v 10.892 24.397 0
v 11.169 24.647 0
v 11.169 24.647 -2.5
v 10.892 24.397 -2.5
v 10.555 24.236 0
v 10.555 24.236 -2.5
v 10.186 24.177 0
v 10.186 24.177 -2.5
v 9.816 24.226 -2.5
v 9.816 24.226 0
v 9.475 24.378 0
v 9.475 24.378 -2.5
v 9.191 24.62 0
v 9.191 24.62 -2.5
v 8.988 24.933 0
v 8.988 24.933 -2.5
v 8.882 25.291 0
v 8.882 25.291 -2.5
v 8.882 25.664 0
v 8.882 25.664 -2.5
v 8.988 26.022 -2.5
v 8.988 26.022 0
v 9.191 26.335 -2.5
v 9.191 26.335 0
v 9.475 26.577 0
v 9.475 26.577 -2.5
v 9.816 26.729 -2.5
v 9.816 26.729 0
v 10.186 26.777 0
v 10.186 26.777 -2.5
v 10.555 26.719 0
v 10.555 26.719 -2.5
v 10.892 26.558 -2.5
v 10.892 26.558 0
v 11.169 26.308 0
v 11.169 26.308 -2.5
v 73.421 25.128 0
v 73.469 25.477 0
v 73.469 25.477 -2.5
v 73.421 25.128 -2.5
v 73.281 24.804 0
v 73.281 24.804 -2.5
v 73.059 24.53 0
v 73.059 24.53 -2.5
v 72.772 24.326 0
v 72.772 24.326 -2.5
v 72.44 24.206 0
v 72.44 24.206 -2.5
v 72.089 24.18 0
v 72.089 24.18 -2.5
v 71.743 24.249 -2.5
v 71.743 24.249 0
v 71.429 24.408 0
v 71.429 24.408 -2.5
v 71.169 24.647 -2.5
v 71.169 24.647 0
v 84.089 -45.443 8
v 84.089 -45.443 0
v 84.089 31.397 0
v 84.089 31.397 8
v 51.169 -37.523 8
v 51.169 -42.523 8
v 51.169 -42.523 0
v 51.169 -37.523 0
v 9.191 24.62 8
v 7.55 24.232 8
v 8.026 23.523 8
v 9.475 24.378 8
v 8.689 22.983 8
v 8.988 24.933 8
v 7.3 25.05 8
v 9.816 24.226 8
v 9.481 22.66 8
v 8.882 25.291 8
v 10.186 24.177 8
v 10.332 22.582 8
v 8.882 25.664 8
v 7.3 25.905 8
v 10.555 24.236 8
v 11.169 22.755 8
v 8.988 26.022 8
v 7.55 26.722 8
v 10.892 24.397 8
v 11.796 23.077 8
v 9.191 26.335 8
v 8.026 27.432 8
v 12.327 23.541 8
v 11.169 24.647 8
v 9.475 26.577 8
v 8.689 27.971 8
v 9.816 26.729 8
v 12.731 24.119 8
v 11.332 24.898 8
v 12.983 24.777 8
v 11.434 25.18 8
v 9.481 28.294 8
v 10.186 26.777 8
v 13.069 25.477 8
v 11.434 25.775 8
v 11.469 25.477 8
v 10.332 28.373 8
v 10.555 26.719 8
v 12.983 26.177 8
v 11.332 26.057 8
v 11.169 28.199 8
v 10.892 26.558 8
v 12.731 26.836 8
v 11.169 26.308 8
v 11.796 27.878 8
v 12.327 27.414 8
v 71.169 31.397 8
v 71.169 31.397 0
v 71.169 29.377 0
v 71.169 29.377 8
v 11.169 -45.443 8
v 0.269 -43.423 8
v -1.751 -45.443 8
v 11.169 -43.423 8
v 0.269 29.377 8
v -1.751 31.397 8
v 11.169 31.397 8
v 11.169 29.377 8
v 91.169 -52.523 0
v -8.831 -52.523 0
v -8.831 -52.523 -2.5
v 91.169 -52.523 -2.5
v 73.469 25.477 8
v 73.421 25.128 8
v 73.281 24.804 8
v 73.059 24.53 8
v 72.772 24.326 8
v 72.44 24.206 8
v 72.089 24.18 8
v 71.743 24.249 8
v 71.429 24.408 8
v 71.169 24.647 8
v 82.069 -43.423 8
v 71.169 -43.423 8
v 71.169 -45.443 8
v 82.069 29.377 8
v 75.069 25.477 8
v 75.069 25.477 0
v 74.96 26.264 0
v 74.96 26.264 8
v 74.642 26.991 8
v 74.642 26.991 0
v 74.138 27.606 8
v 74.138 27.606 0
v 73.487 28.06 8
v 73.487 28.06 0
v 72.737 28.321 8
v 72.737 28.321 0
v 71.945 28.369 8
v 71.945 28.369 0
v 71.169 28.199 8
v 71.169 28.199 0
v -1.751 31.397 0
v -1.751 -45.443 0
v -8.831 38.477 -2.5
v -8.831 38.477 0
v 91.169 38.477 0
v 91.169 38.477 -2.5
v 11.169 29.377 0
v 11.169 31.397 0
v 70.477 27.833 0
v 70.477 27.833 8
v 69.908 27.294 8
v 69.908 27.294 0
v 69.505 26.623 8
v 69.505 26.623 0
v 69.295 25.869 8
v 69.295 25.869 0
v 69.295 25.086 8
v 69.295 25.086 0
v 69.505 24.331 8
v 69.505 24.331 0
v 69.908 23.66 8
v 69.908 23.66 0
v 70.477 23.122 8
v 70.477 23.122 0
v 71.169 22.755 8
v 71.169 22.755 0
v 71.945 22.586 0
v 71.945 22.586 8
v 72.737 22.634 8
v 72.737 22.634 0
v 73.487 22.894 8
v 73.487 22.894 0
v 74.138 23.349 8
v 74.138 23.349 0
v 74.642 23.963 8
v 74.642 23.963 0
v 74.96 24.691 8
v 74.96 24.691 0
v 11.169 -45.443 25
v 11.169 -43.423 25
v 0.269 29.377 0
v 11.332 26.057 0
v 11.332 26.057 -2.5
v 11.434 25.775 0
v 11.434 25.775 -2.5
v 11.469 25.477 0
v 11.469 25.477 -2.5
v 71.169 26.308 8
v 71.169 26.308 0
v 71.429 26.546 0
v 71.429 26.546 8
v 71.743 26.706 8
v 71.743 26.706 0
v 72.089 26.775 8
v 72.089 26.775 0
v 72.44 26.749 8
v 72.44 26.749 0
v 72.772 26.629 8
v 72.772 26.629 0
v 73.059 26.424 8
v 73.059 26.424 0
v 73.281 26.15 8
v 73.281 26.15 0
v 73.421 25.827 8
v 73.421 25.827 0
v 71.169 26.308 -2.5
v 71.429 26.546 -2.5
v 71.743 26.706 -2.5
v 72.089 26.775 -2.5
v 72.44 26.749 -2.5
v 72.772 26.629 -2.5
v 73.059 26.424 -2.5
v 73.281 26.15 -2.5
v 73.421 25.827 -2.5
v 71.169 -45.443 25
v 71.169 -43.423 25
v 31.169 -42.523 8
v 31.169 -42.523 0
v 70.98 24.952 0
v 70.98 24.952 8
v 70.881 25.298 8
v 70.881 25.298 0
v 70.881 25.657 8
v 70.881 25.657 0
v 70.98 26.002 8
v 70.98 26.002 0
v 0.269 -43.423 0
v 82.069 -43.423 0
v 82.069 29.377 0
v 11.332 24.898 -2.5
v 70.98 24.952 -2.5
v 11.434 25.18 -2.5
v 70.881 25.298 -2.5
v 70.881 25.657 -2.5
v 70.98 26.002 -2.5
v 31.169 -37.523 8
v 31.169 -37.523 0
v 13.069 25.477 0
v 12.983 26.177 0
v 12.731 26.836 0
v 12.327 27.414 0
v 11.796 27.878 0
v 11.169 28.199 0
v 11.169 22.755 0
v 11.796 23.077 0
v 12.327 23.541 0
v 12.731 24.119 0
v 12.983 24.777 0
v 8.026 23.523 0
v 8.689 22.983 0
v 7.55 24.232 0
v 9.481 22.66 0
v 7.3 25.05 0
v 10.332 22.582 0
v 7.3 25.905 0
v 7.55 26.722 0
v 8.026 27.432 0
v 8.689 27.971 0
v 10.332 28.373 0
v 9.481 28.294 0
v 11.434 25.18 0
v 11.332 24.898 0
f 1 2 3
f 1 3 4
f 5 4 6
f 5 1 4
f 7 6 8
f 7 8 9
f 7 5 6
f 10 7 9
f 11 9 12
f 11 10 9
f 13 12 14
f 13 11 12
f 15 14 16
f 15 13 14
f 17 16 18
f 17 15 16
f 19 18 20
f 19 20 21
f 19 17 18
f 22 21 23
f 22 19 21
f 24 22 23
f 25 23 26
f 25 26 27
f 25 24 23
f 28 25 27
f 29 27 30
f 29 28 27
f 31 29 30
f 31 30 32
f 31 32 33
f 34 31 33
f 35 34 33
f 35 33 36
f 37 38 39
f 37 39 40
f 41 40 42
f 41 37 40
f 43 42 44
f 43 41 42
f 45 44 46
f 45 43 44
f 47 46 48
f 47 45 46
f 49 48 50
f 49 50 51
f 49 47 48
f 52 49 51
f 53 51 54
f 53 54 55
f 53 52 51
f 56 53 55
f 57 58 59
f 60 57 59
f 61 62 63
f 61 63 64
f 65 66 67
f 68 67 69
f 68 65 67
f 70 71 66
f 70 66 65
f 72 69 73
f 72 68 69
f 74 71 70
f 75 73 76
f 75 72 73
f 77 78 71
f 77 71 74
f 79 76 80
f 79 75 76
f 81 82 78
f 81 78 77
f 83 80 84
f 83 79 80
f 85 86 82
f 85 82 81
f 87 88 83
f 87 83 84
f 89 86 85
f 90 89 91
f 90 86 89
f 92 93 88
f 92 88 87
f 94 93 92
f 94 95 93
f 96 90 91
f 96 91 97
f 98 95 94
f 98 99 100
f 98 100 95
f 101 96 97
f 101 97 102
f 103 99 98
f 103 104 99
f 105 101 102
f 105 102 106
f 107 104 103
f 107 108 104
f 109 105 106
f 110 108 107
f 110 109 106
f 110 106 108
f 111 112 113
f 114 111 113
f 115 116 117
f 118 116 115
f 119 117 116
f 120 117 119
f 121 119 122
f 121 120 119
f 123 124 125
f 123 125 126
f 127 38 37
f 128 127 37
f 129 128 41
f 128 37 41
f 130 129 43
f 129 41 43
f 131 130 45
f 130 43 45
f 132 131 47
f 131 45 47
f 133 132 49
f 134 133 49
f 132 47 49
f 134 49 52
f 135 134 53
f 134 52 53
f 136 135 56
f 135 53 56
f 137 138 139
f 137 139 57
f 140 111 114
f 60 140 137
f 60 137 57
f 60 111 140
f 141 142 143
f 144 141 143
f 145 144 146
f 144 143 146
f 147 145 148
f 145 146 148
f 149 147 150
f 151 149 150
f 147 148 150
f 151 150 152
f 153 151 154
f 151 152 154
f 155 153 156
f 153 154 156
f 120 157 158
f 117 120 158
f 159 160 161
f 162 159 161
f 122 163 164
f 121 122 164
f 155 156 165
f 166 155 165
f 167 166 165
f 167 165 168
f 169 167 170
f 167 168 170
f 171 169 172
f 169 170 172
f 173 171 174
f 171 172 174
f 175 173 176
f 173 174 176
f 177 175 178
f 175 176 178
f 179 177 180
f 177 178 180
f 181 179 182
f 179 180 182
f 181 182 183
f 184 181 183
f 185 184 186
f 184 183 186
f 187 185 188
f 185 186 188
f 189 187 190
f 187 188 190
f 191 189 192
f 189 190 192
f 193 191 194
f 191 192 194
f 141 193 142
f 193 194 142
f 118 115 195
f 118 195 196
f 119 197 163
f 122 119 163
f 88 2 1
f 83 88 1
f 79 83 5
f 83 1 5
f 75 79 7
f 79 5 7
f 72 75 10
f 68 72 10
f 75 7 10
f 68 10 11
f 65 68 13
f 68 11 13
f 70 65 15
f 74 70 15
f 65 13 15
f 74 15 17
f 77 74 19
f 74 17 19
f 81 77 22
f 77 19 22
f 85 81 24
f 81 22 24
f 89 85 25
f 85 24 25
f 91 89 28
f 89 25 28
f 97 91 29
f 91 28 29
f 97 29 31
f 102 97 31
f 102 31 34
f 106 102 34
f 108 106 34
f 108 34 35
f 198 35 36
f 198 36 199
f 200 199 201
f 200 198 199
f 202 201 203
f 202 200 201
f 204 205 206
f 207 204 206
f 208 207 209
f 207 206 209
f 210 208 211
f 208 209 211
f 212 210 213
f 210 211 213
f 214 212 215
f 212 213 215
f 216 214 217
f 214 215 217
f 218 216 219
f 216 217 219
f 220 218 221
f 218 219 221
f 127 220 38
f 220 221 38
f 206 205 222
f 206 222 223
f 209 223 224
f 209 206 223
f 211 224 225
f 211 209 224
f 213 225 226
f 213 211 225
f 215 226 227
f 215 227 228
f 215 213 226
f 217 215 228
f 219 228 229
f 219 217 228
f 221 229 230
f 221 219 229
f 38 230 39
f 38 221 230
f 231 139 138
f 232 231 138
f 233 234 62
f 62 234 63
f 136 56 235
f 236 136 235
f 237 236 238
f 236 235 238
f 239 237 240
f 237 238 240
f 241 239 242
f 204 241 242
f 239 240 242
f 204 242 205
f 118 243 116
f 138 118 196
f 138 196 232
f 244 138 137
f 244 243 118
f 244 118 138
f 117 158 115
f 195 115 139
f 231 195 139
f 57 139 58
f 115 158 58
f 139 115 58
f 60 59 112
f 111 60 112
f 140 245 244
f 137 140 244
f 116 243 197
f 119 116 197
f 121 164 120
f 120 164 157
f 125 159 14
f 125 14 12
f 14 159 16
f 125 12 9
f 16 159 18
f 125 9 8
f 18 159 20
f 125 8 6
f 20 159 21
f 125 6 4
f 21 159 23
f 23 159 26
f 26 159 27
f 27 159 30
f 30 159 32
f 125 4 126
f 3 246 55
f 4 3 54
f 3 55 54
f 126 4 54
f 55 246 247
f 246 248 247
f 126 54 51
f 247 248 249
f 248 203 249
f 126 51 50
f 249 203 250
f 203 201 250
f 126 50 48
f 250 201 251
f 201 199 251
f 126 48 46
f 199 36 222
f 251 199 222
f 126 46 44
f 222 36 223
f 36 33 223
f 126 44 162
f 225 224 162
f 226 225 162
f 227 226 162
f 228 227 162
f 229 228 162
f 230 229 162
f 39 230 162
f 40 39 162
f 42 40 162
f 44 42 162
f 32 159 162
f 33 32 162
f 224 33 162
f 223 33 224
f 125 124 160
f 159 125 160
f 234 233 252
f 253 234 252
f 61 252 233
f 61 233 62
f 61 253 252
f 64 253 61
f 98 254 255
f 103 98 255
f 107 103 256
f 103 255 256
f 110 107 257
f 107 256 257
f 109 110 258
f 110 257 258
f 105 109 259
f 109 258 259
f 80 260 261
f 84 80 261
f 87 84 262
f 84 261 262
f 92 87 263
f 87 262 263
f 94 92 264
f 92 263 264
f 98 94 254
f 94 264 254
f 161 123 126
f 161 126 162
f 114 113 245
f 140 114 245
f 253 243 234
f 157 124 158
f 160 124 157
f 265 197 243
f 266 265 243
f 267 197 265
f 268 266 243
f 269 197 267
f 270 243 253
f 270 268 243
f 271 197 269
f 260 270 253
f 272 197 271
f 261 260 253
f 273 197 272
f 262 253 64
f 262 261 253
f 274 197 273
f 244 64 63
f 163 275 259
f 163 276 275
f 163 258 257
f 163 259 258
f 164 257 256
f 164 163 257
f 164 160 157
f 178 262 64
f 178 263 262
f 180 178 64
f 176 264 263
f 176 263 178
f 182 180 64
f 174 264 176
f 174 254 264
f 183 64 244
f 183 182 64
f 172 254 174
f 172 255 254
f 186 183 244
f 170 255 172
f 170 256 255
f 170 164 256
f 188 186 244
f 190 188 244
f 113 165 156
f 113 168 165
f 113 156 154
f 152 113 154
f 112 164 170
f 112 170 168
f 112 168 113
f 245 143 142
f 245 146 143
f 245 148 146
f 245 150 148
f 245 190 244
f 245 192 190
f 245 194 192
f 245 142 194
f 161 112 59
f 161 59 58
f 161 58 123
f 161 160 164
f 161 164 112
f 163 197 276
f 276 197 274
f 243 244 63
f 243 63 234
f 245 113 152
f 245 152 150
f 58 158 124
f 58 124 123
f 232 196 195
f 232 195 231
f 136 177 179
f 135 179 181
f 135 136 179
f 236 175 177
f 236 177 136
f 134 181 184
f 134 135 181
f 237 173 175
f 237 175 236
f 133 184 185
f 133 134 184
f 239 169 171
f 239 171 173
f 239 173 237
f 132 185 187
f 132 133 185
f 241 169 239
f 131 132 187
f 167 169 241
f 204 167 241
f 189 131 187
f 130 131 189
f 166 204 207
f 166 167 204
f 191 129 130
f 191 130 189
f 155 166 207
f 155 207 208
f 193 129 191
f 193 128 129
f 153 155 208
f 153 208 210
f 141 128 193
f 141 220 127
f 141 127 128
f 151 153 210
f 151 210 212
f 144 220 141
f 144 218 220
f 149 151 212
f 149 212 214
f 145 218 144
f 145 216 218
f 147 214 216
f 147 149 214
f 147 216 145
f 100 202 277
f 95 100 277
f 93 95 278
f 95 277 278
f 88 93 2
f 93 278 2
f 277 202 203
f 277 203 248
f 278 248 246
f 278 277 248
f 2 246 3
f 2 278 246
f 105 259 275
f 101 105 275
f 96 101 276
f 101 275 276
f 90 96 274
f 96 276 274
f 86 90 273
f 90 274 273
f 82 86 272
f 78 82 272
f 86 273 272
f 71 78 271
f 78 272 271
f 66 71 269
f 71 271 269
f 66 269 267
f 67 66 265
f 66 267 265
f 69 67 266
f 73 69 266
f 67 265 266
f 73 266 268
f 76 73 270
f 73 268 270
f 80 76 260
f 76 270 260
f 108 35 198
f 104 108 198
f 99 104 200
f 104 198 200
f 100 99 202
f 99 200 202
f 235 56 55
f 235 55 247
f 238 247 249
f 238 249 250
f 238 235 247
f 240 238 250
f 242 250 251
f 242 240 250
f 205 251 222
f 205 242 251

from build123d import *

# Parameters (mm, degrees)
F0_W     = 100
F0_H     = 91
F0_W_2   = 60
F0_H_2   = 2.0199990959
F0_W_3   = 20
F0_H_3   = 5
F0_H_4   = 0.9000000043
F1_DEPTH = 2.5
F2_DEPTH = 8
F3_DEPTH = 8
F4_DEPTH = 25


with BuildPart() as f1:
    # F0 (on Top) → F1 (new body)
    with BuildSketch(Plane.XY):
        with Locations((41.1687159911, -7.0227757916)):
            Rectangle(F0_W, F0_H)
        Polygon((-1.7512831092, 31.3972233087), (11.1687159911, 31.3972233087), (71.1687159911, 31.3972233087), (84.0887150913, 31.3972233087), (84.0887150913, -45.4427748919), (71.1687159911, -45.4427748919), (11.1687159911, -45.4427748919), (-1.7512831092, -45.4427748919), align=None, mode=Mode.SUBTRACT)
        with BuildLine():
            Line((71.1687159911, 28.4772242084), (11.1687159911, 28.4772242084))
            Line((11.1687159911, 28.4772242084), (11.1687159911, 28.1993557262))
            ThreePointArc((11.1687159911, 28.1993557262), (12.5467403812, 27.1370434757), (13.0687159911, 25.4772242084))
            ThreePointArc((13.0687159911, 25.4772242084), (12.5467403812, 23.8174049411), (11.1687159911, 22.7550926907))
            Line((11.1687159911, 22.7550926907), (11.1687159911, -42.5227757916))
            Line((11.1687159911, -42.5227757916), (31.1687159911, -42.5227757916))
            Line((31.1687159911, -42.5227757916), (31.1687159911, -37.5227757916))
            Line((31.1687159911, -37.5227757916), (51.1687159911, -37.5227757916))
            Line((51.1687159911, -37.5227757916), (51.1687159911, -42.5227757916))
            Line((51.1687159911, -42.5227757916), (71.1687159911, -42.5227757916))
            Line((71.1687159911, -42.5227757916), (71.1687159911, 22.7550926907))
            ThreePointArc((71.1687159911, 22.7550926907), (69.2687159911, 25.4772242084), (71.1687159911, 28.1993557262))
            Line((71.1687159911, 28.1993557262), (71.1687159911, 28.4772242084))
        make_face()
        with BuildLine():
            Line((11.1687159911, 28.4772242084), (1.1687159911, 28.4772242084))
            Line((1.1687159911, 28.4772242084), (1.1687159911, -42.5227757916))
            Line((1.1687159911, -42.5227757916), (11.1687159911, -42.5227757916))
            Line((11.1687159911, -42.5227757916), (11.1687159911, 22.7550926907))
            ThreePointArc((11.1687159911, 22.7550926907), (7.2687159911, 25.4772242084), (11.1687159911, 28.1993557262))
            Line((11.1687159911, 28.1993557262), (11.1687159911, 28.4772242084))
        make_face()
        with BuildLine():
            Line((81.1687159911, 28.4772242084), (71.1687159911, 28.4772242084))
            Line((71.1687159911, 28.4772242084), (71.1687159911, 28.1993557262))
            ThreePointArc((71.1687159911, 28.1993557262), (73.8285352583, 27.8552485985), (75.0687159911, 25.4772242084))
            ThreePointArc((75.0687159911, 25.4772242084), (73.8285352583, 23.0991998183), (71.1687159911, 22.7550926907))
            Line((71.1687159911, 22.7550926907), (71.1687159911, -42.5227757916))
            Line((71.1687159911, -42.5227757916), (81.1687159911, -42.5227757916))
            Line((81.1687159911, -42.5227757916), (81.1687159911, 28.4772242084))
        make_face()
        Polygon((0.2687159867, 29.3772242127), (11.1687159911, 29.3772242127), (11.1687159911, 31.3972233087), (-1.7512831092, 31.3972233087), (-1.7512831092, -45.4427748919), (11.1687159911, -45.4427748919), (11.1687159911, -43.4227757959), (0.2687159867, -43.4227757959), align=None)
        Polygon((71.1687159911, 31.3972233087), (71.1687159911, 29.3772242127), (82.0687159954, 29.3772242127), (82.0687159954, -43.4227757959), (71.1687159911, -43.4227757959), (71.1687159911, -45.4427748919), (84.0887150913, -45.4427748919), (84.0887150913, 31.3972233087), align=None)
        with Locations((41.1687159911, 30.3872237607)):
            Rectangle(F0_W_2, F0_H_2)
        with Locations((41.1687159911, -44.4327753439)):
            Rectangle(F0_W_2, F0_H_2)
        with Locations((41.1687159911, -40.0227757916)):
            Rectangle(F0_W_3, F0_H_3)
        Polygon((1.1687159911, -42.5227757916), (1.1687159911, 28.4772242084), (11.1687159911, 28.4772242084), (11.1687159911, 29.3772242127), (0.2687159867, 29.3772242127), (0.2687159867, -43.4227757959), (11.1687159911, -43.4227757959), (11.1687159911, -42.5227757916), align=None)
        Polygon((71.1687159911, 29.3772242127), (71.1687159911, 28.4772242084), (81.1687159911, 28.4772242084), (81.1687159911, -42.5227757916), (71.1687159911, -42.5227757916), (71.1687159911, -43.4227757959), (82.0687159954, -43.4227757959), (82.0687159954, 29.3772242127), align=None)
        with Locations((41.1687159911, 28.9272242106)):
            Rectangle(F0_W_2, F0_H_4)
        Polygon((31.1687159911, -42.5227757916), (11.1687159911, -42.5227757916), (11.1687159911, -43.4227757959), (71.1687159911, -43.4227757959), (71.1687159911, -42.5227757916), (51.1687159911, -42.5227757916), align=None)
        with BuildLine():
            Line((11.1687159911, 26.3078865947), (11.1687159911, 28.1993557262))
            ThreePointArc((11.1687159911, 28.1993557262), (7.2687159911, 25.4772242084), (11.1687159911, 22.7550926907))
            Line((11.1687159911, 22.7550926907), (11.1687159911, 24.6465618221))
            ThreePointArc((11.1687159911, 24.6465618221), (8.8687159911, 25.4772242084), (11.1687159911, 26.3078865947))
        make_face()
        with BuildLine():
            ThreePointArc((75.0687159911, 25.4772242084), (73.8285352583, 27.8552485985), (71.1687159911, 28.1993557262))
            Line((71.1687159911, 28.1993557262), (71.1687159911, 26.3078865947))
            ThreePointArc((71.1687159911, 26.3078865947), (72.6103040344, 26.6999261345), (73.4687159911, 25.4772242084))
            ThreePointArc((73.4687159911, 25.4772242084), (72.6103040344, 24.2545222824), (71.1687159911, 24.6465618221))
            Line((71.1687159911, 24.6465618221), (71.1687159911, 22.7550926907))
            ThreePointArc((71.1687159911, 22.7550926907), (73.8285352583, 23.0991998183), (75.0687159911, 25.4772242084))
        make_face()
        with BuildLine():
            ThreePointArc((13.0687159911, 25.4772242084), (12.5467403812, 27.1370434757), (11.1687159911, 28.1993557262))
            Line((11.1687159911, 28.1993557262), (11.1687159911, 26.3078865947))
            ThreePointArc((11.1687159911, 26.3078865947), (11.3914179171, 25.9188122517), (11.4687159911, 25.4772242084))
            ThreePointArc((11.4687159911, 25.4772242084), (11.3914179171, 25.0356361651), (11.1687159911, 24.6465618221))
            Line((11.1687159911, 24.6465618221), (11.1687159911, 22.7550926907))
            ThreePointArc((11.1687159911, 22.7550926907), (12.5467403812, 23.8174049411), (13.0687159911, 25.4772242084))
        make_face()
        with BuildLine():
            Line((71.1687159911, 26.3078865947), (71.1687159911, 28.1993557262))
            ThreePointArc((71.1687159911, 28.1993557262), (69.2687159911, 25.4772242084), (71.1687159911, 22.7550926907))
            Line((71.1687159911, 22.7550926907), (71.1687159911, 24.6465618221))
            ThreePointArc((71.1687159911, 24.6465618221), (70.8687159911, 25.4772242084), (71.1687159911, 26.3078865947))
        make_face()
    extrude(amount=-F1_DEPTH)

    # F0 (on Top) → F2 (join)
    with BuildSketch(Plane.XY):
        with Locations((41.1687159911, -40.0227757916)):
            Rectangle(F0_W_3, F0_H_3)
        with BuildLine():
            Line((11.1687159911, 26.3078865947), (11.1687159911, 28.1993557262))
            ThreePointArc((11.1687159911, 28.1993557262), (7.2687159911, 25.4772242084), (11.1687159911, 22.7550926907))
            Line((11.1687159911, 22.7550926907), (11.1687159911, 24.6465618221))
            ThreePointArc((11.1687159911, 24.6465618221), (8.8687159911, 25.4772242084), (11.1687159911, 26.3078865947))
        make_face()
        with BuildLine():
            ThreePointArc((13.0687159911, 25.4772242084), (12.5467403812, 27.1370434757), (11.1687159911, 28.1993557262))
            Line((11.1687159911, 28.1993557262), (11.1687159911, 26.3078865947))
            ThreePointArc((11.1687159911, 26.3078865947), (11.3914179171, 25.9188122517), (11.4687159911, 25.4772242084))
            ThreePointArc((11.4687159911, 25.4772242084), (11.3914179171, 25.0356361651), (11.1687159911, 24.6465618221))
            Line((11.1687159911, 24.6465618221), (11.1687159911, 22.7550926907))
            ThreePointArc((11.1687159911, 22.7550926907), (12.5467403812, 23.8174049411), (13.0687159911, 25.4772242084))
        make_face()
        with BuildLine():
            Line((71.1687159911, 26.3078865947), (71.1687159911, 28.1993557262))
            ThreePointArc((71.1687159911, 28.1993557262), (69.2687159911, 25.4772242084), (71.1687159911, 22.7550926907))
            Line((71.1687159911, 22.7550926907), (71.1687159911, 24.6465618221))
            ThreePointArc((71.1687159911, 24.6465618221), (70.8687159911, 25.4772242084), (71.1687159911, 26.3078865947))
        make_face()
        with BuildLine():
            ThreePointArc((75.0687159911, 25.4772242084), (73.8285352583, 27.8552485985), (71.1687159911, 28.1993557262))
            Line((71.1687159911, 28.1993557262), (71.1687159911, 26.3078865947))
            ThreePointArc((71.1687159911, 26.3078865947), (72.6103040344, 26.6999261345), (73.4687159911, 25.4772242084))
            ThreePointArc((73.4687159911, 25.4772242084), (72.6103040344, 24.2545222824), (71.1687159911, 24.6465618221))
            Line((71.1687159911, 24.6465618221), (71.1687159911, 22.7550926907))
            ThreePointArc((71.1687159911, 22.7550926907), (73.8285352583, 23.0991998183), (75.0687159911, 25.4772242084))
        make_face()
    extrude(amount=F2_DEPTH)

    # F0 (on Top) → F3 (join)
    with BuildSketch(Plane.XY):
        Polygon((0.2687159867, 29.3772242127), (11.1687159911, 29.3772242127), (11.1687159911, 31.3972233087), (-1.7512831092, 31.3972233087), (-1.7512831092, -45.4427748919), (11.1687159911, -45.4427748919), (11.1687159911, -43.4227757959), (0.2687159867, -43.4227757959), align=None)
        Polygon((71.1687159911, 31.3972233087), (71.1687159911, 29.3772242127), (82.0687159954, 29.3772242127), (82.0687159954, -43.4227757959), (71.1687159911, -43.4227757959), (71.1687159911, -45.4427748919), (84.0887150913, -45.4427748919), (84.0887150913, 31.3972233087), align=None)
    extrude(amount=F3_DEPTH)

    # F0 (on Top) → F4 (join)
    with BuildSketch(Plane.XY):
        with Locations((41.1687159911, -44.4327753439)):
            Rectangle(F0_W_2, F0_H_2)
    extrude(amount=F4_DEPTH)


solid = f1.part
